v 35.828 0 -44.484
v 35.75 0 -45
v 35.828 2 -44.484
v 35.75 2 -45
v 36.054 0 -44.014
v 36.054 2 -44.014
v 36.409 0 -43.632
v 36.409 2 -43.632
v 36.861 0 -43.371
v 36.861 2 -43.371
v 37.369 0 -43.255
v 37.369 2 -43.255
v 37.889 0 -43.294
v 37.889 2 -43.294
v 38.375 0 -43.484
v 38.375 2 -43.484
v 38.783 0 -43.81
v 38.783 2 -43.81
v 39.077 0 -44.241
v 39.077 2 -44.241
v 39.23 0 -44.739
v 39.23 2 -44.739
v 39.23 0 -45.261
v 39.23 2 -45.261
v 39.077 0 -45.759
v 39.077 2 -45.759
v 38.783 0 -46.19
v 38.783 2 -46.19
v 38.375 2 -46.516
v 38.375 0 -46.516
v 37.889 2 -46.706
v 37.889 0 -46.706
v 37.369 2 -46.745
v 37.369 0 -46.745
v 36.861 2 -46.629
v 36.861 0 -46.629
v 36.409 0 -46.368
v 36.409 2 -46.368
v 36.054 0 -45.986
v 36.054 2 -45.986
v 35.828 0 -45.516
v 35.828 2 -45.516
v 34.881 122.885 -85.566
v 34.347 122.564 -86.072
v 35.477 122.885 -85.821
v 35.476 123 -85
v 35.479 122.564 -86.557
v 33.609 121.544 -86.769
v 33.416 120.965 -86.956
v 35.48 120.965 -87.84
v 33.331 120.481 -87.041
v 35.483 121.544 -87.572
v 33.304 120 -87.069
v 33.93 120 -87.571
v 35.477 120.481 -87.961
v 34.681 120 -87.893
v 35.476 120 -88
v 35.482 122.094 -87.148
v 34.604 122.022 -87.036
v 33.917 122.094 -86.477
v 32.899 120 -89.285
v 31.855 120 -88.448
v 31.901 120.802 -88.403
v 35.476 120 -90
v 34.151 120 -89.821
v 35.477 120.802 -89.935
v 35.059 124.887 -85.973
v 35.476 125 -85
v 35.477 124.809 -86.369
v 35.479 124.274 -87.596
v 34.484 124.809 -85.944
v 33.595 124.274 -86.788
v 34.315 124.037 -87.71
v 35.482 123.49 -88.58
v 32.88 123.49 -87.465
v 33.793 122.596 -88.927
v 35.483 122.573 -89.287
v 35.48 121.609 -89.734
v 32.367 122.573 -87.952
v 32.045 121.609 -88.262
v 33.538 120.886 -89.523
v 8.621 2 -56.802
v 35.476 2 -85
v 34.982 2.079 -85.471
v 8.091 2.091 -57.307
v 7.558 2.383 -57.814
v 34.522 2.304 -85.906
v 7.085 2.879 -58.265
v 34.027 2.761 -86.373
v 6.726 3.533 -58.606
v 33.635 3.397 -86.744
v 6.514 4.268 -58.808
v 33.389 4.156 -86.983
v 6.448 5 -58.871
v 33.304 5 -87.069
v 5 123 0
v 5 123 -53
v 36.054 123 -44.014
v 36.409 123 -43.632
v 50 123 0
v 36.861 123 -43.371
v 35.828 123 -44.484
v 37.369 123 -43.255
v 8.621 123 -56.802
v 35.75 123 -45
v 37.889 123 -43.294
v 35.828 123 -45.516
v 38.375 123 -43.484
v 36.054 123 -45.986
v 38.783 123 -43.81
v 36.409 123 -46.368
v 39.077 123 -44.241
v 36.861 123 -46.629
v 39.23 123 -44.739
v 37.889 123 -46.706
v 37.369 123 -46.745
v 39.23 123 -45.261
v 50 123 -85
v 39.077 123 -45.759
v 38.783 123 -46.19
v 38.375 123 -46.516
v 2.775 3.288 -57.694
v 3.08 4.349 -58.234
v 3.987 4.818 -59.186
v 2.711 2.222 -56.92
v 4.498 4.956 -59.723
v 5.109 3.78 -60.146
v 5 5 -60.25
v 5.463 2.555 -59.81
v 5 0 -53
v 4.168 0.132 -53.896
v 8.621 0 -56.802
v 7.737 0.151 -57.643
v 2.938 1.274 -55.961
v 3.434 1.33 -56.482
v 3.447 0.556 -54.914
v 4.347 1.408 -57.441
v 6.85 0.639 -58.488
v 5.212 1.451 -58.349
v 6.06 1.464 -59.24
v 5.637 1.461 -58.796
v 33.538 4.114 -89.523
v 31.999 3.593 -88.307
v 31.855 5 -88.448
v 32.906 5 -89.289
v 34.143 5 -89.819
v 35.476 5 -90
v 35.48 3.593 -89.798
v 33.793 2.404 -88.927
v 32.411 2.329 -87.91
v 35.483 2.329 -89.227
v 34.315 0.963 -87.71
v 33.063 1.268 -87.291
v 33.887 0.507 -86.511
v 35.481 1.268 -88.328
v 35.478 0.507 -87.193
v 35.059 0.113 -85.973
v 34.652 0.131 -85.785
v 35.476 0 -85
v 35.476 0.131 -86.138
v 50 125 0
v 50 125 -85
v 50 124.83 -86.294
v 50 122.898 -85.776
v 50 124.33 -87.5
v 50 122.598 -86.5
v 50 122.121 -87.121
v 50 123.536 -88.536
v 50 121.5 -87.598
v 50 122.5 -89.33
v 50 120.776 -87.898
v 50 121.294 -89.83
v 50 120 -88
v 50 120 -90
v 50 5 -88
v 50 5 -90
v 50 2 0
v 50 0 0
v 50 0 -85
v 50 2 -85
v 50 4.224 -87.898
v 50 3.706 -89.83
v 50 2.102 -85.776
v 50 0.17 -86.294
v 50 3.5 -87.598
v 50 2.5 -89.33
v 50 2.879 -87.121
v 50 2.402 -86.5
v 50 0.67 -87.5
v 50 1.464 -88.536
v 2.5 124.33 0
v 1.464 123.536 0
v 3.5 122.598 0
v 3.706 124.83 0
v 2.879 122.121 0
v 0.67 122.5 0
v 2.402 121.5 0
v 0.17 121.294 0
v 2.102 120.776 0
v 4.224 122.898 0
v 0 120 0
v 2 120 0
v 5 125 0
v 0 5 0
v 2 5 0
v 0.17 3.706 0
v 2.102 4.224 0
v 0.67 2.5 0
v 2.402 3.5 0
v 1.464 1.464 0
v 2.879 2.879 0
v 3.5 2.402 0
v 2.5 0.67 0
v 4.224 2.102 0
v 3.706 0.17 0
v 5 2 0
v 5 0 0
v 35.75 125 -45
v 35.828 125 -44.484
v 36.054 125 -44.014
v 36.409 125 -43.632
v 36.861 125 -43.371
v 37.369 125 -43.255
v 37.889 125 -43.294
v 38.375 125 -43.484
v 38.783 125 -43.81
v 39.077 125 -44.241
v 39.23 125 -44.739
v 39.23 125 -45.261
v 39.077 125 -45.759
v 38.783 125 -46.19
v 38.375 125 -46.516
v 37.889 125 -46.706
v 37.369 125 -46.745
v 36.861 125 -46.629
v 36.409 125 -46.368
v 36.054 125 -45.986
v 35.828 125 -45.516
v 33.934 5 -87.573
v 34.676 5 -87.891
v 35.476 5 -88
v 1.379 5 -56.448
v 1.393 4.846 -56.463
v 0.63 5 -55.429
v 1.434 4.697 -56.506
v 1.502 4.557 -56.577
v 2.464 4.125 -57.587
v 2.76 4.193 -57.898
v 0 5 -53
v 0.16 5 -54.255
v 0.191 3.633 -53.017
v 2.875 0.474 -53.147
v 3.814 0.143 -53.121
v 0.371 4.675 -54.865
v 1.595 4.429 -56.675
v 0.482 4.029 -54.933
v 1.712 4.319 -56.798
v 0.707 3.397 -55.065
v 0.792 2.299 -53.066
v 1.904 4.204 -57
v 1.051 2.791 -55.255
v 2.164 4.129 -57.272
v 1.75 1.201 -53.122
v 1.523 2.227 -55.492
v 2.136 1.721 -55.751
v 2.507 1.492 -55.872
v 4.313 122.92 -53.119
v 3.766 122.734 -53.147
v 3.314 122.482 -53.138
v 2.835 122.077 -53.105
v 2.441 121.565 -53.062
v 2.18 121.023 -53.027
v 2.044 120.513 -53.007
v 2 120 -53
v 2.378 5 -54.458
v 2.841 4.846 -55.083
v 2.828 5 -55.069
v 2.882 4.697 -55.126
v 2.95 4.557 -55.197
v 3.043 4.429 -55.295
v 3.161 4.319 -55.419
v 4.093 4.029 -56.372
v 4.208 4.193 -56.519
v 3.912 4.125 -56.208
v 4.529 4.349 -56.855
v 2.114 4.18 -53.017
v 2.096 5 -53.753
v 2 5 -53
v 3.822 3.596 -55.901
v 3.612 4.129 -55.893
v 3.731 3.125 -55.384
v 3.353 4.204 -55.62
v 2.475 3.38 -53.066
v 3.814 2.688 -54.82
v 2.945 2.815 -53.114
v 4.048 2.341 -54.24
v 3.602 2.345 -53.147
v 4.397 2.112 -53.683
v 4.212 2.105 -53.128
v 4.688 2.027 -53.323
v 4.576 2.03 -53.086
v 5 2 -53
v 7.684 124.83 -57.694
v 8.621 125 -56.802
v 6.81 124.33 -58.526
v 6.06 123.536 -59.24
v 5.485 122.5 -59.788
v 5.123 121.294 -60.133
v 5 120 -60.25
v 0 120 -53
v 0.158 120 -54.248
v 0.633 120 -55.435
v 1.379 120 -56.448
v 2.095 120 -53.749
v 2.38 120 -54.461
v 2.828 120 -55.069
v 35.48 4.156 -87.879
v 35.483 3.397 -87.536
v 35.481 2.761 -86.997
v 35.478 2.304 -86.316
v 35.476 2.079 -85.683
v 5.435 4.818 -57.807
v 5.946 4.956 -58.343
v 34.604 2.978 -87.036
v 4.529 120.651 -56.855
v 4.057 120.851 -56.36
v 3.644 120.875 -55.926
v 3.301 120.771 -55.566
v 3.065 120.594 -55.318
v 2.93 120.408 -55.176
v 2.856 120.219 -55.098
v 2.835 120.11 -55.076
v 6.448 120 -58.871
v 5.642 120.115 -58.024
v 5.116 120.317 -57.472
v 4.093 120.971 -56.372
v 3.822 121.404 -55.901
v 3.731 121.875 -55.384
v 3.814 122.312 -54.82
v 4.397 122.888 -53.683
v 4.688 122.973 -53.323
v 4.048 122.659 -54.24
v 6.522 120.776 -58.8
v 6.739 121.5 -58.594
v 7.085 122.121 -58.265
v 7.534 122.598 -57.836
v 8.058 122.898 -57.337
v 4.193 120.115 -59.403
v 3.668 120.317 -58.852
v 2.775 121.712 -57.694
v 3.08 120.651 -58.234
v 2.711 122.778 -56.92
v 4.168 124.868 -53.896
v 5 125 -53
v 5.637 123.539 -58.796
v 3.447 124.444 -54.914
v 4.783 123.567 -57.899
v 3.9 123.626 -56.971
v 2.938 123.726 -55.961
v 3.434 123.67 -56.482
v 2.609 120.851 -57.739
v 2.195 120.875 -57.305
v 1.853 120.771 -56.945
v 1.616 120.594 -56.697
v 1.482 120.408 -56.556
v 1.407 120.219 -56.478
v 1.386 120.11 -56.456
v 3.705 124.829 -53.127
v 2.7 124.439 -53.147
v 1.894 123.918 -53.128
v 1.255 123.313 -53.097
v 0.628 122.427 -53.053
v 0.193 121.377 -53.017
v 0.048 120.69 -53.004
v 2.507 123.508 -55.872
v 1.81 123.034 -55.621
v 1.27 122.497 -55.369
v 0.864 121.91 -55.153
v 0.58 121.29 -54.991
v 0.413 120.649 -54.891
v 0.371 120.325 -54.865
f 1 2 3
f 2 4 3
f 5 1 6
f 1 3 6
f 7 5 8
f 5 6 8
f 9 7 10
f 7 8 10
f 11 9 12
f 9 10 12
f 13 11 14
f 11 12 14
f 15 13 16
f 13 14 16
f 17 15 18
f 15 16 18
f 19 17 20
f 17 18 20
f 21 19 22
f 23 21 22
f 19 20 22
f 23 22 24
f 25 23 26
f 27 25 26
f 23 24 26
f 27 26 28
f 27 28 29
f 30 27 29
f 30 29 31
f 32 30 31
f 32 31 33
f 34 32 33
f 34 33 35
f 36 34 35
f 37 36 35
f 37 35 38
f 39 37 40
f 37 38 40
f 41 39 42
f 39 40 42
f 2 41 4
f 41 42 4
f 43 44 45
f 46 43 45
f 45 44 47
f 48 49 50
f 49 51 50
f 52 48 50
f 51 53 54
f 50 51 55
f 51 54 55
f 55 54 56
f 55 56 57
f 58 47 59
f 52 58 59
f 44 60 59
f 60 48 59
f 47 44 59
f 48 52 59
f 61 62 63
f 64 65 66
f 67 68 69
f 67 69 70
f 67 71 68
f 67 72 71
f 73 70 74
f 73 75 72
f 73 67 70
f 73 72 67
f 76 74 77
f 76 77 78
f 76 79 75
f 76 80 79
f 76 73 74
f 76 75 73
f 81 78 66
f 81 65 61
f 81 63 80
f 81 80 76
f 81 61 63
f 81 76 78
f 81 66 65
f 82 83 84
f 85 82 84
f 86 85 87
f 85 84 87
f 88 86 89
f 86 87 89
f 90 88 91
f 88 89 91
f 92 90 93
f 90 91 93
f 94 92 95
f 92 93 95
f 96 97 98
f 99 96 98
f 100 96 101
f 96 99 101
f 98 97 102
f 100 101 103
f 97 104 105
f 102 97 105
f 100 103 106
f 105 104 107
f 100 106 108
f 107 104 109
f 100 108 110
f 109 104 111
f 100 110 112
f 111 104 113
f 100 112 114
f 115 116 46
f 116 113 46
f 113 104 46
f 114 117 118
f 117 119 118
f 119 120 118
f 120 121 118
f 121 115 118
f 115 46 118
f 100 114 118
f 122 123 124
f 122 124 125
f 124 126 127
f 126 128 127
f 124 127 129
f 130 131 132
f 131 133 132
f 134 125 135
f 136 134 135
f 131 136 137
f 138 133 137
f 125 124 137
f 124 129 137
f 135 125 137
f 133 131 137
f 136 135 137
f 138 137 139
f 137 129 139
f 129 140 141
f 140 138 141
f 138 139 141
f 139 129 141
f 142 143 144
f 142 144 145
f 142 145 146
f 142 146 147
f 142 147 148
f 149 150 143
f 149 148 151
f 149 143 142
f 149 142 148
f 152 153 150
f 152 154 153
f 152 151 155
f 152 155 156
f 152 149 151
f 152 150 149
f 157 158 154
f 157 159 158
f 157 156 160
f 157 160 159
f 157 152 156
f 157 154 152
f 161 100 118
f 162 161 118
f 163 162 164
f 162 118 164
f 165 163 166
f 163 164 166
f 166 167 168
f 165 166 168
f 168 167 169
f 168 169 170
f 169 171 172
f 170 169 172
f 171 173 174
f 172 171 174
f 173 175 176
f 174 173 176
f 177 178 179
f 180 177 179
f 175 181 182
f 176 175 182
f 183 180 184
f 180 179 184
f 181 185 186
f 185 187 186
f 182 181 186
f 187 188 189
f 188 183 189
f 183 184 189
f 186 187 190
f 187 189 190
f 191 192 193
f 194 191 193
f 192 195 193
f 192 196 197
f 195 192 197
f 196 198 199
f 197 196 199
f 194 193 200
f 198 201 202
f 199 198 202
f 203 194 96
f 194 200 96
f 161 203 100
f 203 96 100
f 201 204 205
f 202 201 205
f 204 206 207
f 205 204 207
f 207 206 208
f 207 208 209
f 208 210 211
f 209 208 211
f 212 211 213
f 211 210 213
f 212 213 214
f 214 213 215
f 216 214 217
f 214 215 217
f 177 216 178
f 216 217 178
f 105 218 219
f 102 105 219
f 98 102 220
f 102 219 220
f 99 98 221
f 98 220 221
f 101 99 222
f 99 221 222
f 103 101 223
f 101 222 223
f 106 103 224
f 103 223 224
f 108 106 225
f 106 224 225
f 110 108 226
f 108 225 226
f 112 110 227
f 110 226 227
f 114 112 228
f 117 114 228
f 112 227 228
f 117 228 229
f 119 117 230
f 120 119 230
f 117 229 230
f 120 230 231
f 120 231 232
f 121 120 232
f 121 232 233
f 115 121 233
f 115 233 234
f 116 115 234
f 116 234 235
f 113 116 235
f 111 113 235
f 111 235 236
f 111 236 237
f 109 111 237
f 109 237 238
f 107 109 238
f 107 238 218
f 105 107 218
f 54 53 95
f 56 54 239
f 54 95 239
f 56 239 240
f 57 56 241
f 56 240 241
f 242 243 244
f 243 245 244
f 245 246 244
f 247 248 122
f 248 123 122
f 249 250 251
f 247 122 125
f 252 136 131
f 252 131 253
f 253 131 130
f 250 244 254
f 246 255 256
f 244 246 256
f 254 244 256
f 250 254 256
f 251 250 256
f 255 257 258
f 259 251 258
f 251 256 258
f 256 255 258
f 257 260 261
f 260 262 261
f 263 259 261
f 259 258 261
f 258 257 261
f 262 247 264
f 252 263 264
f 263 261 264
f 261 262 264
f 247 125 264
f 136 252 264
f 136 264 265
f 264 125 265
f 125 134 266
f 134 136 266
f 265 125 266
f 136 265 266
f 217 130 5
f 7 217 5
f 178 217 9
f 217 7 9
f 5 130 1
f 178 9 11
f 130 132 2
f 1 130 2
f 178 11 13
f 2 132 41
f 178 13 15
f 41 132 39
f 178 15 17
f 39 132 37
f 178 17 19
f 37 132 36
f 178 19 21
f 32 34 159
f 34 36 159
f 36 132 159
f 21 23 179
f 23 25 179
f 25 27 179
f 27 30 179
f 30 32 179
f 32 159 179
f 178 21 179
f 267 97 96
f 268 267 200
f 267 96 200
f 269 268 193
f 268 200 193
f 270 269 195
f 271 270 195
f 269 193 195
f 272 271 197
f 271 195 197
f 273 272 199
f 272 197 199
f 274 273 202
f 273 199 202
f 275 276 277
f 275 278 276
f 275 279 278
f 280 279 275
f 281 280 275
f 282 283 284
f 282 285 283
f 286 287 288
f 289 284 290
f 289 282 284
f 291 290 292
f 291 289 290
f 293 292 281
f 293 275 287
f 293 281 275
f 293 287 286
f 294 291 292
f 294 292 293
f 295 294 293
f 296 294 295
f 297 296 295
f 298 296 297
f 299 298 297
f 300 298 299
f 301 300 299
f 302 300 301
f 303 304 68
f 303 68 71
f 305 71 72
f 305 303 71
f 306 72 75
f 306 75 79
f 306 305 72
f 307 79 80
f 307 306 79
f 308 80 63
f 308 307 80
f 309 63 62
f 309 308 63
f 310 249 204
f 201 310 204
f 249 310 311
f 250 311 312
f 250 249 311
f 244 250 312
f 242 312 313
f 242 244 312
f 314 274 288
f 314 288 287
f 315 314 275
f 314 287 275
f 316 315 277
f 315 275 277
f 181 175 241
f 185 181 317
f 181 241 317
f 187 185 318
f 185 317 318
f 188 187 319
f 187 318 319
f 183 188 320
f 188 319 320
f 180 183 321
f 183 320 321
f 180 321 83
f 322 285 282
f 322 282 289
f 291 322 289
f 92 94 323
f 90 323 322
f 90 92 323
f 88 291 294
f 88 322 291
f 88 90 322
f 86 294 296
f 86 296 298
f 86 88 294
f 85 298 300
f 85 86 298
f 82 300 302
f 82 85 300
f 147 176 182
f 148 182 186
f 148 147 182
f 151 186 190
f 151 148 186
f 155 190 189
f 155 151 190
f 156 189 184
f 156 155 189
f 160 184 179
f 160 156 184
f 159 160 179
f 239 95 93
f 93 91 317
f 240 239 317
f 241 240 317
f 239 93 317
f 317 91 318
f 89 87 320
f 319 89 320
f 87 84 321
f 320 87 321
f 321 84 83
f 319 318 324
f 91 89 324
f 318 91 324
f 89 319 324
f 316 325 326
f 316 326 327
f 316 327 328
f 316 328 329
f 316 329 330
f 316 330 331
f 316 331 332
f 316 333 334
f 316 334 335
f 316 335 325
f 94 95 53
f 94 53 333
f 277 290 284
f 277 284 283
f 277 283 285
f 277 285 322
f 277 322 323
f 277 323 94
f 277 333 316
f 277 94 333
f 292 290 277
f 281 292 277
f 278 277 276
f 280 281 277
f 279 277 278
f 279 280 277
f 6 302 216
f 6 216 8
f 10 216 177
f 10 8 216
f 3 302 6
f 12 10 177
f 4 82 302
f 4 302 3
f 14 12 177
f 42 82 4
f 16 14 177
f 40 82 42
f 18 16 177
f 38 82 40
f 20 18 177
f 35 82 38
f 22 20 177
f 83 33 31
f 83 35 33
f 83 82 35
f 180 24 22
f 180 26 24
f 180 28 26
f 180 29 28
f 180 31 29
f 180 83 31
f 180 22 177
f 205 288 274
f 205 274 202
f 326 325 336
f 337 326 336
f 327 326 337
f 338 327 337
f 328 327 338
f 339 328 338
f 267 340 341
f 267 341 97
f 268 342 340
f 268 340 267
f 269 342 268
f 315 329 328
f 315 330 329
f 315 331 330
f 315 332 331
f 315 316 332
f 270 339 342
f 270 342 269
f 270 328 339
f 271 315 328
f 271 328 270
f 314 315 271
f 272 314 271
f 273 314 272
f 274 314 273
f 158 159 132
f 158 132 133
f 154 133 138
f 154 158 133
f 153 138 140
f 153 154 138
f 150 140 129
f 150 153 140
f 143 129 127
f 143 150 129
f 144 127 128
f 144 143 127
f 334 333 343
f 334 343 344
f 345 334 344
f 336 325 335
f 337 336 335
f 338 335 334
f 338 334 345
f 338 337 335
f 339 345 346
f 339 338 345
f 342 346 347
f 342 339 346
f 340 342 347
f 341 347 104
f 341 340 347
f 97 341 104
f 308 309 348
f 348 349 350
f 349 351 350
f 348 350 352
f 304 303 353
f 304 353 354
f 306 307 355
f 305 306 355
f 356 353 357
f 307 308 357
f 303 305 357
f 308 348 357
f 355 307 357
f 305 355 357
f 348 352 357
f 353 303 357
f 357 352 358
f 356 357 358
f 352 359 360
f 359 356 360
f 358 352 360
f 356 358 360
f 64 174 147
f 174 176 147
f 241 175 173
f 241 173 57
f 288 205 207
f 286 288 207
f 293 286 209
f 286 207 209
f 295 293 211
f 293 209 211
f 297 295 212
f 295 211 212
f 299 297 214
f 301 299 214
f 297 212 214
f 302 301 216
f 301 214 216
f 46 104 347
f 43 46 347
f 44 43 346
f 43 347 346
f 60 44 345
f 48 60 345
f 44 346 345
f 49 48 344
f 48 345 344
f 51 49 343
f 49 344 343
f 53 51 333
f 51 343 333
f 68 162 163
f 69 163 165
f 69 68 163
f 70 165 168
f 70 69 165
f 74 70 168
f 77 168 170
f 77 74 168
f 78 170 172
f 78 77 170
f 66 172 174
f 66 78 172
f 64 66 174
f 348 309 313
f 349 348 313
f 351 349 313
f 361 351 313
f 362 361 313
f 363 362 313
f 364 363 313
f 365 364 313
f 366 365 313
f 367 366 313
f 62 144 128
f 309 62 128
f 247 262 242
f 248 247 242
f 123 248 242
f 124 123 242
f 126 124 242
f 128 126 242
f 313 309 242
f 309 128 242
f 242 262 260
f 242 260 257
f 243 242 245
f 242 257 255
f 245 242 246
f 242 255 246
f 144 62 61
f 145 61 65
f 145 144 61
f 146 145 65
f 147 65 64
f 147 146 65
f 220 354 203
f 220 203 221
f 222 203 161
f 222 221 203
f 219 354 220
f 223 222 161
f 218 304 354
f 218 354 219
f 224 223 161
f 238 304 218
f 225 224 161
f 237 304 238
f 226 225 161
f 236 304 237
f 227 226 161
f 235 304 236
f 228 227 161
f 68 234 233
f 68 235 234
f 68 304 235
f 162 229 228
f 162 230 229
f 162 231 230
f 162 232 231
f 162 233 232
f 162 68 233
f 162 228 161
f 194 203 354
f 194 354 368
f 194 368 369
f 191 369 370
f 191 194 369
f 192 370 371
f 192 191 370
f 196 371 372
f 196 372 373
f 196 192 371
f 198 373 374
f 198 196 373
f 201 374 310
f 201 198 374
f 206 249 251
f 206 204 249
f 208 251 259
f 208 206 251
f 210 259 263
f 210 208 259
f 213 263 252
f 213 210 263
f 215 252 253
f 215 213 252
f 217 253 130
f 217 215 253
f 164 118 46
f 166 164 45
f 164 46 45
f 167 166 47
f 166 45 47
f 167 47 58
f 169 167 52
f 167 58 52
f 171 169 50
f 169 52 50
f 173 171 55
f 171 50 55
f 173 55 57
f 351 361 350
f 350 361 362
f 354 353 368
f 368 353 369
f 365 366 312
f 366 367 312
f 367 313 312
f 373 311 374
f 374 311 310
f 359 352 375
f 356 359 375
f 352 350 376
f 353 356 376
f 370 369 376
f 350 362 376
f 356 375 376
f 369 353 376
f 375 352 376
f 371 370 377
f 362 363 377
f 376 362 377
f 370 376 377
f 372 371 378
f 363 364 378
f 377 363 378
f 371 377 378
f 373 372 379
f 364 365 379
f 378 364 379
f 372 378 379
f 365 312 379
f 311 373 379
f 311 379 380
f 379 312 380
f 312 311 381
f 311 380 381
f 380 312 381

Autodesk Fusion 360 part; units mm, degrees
sketch "Sketch1" plane through (0, 0, 0) normal (0, 1, 0) x (1, 0, 0)
  line L0 (0, 0) -> (50, 0)
  line L1 (50, 0) -> (50, 55)
  line L2 (50, 55) -> (0, 55)
  line L3 (0, 55) -> (0, 0)
  line L4 (50, 55) -> (50, 90)
  line L5 (50, 90) -> (33.3333, 90)
  line L6 (33.3333, 90) -> (0, 55)
  line L7 (28, 76) -> (28, -7.4569) construction
  point P0 (28, 84.4)
  dimension "d1" = 50
  dimension "d2" = 55
  dimension "d3" = 35
  dimension "d4" = 16.6667
  dimension "d17" = 22
extrude "Extrude1" add sketch "Sketch1" along normal blind 125
fillet "Fillet1" radius 5 1 edges at (0, 125, -27.5)
fillet "Fillet2" radius 5 1 edges at (0, 0, -27.5)
fillet "Fillet3" radius 5 7 edges at (19.1667, 125, -75.125) (1.4645, 123.5355, -56.5377) (0, 62.5, -55) (1.4645, 1.4645, -56.5377) (19.1667, 0, -75.125) (41.6667, 125, -90) (41.6667, 0, -90)
fillet "Fillet4" radius 5 3 edges at (33.961, 1.4645, -88.5355) (33.3333, 62.5, -90) (33.961, 123.5355, -88.5355)
shell "Shell1" thickness 2 removed faces 2 at (50, 43.3333, -30) at (33.3333, 81.6667, 0)
sketch "Sketch2" plane through (0, 125, 0) normal (0, 1, 0) x (-1, 0, 0)
  line L0 (-50, -85) -> (-35.4762, -85)
  line L1 (-35.4762, -85) -> (-5, -53)
  line L2 (-5, -53) -> (-5, 0)
  line L3 (-5, 0) -> (-50, 0)
  line L4 (-50, 0) -> (-50, -85)
  line L5 (0, 0) -> (-50, 0)
  line L6 (-5, -53) -> (0, -53)
  circle A0 centre (-37.5, -45) radius 1.75
  dimension "d12" = 3.5
  dimension "d13" = 12.5
  dimension "d16" = 45
extrude "Extrude2" cut sketch "Sketch2" against normal up to surface (125 mm away) contours A0
equation "d4 = d1 / 3"
